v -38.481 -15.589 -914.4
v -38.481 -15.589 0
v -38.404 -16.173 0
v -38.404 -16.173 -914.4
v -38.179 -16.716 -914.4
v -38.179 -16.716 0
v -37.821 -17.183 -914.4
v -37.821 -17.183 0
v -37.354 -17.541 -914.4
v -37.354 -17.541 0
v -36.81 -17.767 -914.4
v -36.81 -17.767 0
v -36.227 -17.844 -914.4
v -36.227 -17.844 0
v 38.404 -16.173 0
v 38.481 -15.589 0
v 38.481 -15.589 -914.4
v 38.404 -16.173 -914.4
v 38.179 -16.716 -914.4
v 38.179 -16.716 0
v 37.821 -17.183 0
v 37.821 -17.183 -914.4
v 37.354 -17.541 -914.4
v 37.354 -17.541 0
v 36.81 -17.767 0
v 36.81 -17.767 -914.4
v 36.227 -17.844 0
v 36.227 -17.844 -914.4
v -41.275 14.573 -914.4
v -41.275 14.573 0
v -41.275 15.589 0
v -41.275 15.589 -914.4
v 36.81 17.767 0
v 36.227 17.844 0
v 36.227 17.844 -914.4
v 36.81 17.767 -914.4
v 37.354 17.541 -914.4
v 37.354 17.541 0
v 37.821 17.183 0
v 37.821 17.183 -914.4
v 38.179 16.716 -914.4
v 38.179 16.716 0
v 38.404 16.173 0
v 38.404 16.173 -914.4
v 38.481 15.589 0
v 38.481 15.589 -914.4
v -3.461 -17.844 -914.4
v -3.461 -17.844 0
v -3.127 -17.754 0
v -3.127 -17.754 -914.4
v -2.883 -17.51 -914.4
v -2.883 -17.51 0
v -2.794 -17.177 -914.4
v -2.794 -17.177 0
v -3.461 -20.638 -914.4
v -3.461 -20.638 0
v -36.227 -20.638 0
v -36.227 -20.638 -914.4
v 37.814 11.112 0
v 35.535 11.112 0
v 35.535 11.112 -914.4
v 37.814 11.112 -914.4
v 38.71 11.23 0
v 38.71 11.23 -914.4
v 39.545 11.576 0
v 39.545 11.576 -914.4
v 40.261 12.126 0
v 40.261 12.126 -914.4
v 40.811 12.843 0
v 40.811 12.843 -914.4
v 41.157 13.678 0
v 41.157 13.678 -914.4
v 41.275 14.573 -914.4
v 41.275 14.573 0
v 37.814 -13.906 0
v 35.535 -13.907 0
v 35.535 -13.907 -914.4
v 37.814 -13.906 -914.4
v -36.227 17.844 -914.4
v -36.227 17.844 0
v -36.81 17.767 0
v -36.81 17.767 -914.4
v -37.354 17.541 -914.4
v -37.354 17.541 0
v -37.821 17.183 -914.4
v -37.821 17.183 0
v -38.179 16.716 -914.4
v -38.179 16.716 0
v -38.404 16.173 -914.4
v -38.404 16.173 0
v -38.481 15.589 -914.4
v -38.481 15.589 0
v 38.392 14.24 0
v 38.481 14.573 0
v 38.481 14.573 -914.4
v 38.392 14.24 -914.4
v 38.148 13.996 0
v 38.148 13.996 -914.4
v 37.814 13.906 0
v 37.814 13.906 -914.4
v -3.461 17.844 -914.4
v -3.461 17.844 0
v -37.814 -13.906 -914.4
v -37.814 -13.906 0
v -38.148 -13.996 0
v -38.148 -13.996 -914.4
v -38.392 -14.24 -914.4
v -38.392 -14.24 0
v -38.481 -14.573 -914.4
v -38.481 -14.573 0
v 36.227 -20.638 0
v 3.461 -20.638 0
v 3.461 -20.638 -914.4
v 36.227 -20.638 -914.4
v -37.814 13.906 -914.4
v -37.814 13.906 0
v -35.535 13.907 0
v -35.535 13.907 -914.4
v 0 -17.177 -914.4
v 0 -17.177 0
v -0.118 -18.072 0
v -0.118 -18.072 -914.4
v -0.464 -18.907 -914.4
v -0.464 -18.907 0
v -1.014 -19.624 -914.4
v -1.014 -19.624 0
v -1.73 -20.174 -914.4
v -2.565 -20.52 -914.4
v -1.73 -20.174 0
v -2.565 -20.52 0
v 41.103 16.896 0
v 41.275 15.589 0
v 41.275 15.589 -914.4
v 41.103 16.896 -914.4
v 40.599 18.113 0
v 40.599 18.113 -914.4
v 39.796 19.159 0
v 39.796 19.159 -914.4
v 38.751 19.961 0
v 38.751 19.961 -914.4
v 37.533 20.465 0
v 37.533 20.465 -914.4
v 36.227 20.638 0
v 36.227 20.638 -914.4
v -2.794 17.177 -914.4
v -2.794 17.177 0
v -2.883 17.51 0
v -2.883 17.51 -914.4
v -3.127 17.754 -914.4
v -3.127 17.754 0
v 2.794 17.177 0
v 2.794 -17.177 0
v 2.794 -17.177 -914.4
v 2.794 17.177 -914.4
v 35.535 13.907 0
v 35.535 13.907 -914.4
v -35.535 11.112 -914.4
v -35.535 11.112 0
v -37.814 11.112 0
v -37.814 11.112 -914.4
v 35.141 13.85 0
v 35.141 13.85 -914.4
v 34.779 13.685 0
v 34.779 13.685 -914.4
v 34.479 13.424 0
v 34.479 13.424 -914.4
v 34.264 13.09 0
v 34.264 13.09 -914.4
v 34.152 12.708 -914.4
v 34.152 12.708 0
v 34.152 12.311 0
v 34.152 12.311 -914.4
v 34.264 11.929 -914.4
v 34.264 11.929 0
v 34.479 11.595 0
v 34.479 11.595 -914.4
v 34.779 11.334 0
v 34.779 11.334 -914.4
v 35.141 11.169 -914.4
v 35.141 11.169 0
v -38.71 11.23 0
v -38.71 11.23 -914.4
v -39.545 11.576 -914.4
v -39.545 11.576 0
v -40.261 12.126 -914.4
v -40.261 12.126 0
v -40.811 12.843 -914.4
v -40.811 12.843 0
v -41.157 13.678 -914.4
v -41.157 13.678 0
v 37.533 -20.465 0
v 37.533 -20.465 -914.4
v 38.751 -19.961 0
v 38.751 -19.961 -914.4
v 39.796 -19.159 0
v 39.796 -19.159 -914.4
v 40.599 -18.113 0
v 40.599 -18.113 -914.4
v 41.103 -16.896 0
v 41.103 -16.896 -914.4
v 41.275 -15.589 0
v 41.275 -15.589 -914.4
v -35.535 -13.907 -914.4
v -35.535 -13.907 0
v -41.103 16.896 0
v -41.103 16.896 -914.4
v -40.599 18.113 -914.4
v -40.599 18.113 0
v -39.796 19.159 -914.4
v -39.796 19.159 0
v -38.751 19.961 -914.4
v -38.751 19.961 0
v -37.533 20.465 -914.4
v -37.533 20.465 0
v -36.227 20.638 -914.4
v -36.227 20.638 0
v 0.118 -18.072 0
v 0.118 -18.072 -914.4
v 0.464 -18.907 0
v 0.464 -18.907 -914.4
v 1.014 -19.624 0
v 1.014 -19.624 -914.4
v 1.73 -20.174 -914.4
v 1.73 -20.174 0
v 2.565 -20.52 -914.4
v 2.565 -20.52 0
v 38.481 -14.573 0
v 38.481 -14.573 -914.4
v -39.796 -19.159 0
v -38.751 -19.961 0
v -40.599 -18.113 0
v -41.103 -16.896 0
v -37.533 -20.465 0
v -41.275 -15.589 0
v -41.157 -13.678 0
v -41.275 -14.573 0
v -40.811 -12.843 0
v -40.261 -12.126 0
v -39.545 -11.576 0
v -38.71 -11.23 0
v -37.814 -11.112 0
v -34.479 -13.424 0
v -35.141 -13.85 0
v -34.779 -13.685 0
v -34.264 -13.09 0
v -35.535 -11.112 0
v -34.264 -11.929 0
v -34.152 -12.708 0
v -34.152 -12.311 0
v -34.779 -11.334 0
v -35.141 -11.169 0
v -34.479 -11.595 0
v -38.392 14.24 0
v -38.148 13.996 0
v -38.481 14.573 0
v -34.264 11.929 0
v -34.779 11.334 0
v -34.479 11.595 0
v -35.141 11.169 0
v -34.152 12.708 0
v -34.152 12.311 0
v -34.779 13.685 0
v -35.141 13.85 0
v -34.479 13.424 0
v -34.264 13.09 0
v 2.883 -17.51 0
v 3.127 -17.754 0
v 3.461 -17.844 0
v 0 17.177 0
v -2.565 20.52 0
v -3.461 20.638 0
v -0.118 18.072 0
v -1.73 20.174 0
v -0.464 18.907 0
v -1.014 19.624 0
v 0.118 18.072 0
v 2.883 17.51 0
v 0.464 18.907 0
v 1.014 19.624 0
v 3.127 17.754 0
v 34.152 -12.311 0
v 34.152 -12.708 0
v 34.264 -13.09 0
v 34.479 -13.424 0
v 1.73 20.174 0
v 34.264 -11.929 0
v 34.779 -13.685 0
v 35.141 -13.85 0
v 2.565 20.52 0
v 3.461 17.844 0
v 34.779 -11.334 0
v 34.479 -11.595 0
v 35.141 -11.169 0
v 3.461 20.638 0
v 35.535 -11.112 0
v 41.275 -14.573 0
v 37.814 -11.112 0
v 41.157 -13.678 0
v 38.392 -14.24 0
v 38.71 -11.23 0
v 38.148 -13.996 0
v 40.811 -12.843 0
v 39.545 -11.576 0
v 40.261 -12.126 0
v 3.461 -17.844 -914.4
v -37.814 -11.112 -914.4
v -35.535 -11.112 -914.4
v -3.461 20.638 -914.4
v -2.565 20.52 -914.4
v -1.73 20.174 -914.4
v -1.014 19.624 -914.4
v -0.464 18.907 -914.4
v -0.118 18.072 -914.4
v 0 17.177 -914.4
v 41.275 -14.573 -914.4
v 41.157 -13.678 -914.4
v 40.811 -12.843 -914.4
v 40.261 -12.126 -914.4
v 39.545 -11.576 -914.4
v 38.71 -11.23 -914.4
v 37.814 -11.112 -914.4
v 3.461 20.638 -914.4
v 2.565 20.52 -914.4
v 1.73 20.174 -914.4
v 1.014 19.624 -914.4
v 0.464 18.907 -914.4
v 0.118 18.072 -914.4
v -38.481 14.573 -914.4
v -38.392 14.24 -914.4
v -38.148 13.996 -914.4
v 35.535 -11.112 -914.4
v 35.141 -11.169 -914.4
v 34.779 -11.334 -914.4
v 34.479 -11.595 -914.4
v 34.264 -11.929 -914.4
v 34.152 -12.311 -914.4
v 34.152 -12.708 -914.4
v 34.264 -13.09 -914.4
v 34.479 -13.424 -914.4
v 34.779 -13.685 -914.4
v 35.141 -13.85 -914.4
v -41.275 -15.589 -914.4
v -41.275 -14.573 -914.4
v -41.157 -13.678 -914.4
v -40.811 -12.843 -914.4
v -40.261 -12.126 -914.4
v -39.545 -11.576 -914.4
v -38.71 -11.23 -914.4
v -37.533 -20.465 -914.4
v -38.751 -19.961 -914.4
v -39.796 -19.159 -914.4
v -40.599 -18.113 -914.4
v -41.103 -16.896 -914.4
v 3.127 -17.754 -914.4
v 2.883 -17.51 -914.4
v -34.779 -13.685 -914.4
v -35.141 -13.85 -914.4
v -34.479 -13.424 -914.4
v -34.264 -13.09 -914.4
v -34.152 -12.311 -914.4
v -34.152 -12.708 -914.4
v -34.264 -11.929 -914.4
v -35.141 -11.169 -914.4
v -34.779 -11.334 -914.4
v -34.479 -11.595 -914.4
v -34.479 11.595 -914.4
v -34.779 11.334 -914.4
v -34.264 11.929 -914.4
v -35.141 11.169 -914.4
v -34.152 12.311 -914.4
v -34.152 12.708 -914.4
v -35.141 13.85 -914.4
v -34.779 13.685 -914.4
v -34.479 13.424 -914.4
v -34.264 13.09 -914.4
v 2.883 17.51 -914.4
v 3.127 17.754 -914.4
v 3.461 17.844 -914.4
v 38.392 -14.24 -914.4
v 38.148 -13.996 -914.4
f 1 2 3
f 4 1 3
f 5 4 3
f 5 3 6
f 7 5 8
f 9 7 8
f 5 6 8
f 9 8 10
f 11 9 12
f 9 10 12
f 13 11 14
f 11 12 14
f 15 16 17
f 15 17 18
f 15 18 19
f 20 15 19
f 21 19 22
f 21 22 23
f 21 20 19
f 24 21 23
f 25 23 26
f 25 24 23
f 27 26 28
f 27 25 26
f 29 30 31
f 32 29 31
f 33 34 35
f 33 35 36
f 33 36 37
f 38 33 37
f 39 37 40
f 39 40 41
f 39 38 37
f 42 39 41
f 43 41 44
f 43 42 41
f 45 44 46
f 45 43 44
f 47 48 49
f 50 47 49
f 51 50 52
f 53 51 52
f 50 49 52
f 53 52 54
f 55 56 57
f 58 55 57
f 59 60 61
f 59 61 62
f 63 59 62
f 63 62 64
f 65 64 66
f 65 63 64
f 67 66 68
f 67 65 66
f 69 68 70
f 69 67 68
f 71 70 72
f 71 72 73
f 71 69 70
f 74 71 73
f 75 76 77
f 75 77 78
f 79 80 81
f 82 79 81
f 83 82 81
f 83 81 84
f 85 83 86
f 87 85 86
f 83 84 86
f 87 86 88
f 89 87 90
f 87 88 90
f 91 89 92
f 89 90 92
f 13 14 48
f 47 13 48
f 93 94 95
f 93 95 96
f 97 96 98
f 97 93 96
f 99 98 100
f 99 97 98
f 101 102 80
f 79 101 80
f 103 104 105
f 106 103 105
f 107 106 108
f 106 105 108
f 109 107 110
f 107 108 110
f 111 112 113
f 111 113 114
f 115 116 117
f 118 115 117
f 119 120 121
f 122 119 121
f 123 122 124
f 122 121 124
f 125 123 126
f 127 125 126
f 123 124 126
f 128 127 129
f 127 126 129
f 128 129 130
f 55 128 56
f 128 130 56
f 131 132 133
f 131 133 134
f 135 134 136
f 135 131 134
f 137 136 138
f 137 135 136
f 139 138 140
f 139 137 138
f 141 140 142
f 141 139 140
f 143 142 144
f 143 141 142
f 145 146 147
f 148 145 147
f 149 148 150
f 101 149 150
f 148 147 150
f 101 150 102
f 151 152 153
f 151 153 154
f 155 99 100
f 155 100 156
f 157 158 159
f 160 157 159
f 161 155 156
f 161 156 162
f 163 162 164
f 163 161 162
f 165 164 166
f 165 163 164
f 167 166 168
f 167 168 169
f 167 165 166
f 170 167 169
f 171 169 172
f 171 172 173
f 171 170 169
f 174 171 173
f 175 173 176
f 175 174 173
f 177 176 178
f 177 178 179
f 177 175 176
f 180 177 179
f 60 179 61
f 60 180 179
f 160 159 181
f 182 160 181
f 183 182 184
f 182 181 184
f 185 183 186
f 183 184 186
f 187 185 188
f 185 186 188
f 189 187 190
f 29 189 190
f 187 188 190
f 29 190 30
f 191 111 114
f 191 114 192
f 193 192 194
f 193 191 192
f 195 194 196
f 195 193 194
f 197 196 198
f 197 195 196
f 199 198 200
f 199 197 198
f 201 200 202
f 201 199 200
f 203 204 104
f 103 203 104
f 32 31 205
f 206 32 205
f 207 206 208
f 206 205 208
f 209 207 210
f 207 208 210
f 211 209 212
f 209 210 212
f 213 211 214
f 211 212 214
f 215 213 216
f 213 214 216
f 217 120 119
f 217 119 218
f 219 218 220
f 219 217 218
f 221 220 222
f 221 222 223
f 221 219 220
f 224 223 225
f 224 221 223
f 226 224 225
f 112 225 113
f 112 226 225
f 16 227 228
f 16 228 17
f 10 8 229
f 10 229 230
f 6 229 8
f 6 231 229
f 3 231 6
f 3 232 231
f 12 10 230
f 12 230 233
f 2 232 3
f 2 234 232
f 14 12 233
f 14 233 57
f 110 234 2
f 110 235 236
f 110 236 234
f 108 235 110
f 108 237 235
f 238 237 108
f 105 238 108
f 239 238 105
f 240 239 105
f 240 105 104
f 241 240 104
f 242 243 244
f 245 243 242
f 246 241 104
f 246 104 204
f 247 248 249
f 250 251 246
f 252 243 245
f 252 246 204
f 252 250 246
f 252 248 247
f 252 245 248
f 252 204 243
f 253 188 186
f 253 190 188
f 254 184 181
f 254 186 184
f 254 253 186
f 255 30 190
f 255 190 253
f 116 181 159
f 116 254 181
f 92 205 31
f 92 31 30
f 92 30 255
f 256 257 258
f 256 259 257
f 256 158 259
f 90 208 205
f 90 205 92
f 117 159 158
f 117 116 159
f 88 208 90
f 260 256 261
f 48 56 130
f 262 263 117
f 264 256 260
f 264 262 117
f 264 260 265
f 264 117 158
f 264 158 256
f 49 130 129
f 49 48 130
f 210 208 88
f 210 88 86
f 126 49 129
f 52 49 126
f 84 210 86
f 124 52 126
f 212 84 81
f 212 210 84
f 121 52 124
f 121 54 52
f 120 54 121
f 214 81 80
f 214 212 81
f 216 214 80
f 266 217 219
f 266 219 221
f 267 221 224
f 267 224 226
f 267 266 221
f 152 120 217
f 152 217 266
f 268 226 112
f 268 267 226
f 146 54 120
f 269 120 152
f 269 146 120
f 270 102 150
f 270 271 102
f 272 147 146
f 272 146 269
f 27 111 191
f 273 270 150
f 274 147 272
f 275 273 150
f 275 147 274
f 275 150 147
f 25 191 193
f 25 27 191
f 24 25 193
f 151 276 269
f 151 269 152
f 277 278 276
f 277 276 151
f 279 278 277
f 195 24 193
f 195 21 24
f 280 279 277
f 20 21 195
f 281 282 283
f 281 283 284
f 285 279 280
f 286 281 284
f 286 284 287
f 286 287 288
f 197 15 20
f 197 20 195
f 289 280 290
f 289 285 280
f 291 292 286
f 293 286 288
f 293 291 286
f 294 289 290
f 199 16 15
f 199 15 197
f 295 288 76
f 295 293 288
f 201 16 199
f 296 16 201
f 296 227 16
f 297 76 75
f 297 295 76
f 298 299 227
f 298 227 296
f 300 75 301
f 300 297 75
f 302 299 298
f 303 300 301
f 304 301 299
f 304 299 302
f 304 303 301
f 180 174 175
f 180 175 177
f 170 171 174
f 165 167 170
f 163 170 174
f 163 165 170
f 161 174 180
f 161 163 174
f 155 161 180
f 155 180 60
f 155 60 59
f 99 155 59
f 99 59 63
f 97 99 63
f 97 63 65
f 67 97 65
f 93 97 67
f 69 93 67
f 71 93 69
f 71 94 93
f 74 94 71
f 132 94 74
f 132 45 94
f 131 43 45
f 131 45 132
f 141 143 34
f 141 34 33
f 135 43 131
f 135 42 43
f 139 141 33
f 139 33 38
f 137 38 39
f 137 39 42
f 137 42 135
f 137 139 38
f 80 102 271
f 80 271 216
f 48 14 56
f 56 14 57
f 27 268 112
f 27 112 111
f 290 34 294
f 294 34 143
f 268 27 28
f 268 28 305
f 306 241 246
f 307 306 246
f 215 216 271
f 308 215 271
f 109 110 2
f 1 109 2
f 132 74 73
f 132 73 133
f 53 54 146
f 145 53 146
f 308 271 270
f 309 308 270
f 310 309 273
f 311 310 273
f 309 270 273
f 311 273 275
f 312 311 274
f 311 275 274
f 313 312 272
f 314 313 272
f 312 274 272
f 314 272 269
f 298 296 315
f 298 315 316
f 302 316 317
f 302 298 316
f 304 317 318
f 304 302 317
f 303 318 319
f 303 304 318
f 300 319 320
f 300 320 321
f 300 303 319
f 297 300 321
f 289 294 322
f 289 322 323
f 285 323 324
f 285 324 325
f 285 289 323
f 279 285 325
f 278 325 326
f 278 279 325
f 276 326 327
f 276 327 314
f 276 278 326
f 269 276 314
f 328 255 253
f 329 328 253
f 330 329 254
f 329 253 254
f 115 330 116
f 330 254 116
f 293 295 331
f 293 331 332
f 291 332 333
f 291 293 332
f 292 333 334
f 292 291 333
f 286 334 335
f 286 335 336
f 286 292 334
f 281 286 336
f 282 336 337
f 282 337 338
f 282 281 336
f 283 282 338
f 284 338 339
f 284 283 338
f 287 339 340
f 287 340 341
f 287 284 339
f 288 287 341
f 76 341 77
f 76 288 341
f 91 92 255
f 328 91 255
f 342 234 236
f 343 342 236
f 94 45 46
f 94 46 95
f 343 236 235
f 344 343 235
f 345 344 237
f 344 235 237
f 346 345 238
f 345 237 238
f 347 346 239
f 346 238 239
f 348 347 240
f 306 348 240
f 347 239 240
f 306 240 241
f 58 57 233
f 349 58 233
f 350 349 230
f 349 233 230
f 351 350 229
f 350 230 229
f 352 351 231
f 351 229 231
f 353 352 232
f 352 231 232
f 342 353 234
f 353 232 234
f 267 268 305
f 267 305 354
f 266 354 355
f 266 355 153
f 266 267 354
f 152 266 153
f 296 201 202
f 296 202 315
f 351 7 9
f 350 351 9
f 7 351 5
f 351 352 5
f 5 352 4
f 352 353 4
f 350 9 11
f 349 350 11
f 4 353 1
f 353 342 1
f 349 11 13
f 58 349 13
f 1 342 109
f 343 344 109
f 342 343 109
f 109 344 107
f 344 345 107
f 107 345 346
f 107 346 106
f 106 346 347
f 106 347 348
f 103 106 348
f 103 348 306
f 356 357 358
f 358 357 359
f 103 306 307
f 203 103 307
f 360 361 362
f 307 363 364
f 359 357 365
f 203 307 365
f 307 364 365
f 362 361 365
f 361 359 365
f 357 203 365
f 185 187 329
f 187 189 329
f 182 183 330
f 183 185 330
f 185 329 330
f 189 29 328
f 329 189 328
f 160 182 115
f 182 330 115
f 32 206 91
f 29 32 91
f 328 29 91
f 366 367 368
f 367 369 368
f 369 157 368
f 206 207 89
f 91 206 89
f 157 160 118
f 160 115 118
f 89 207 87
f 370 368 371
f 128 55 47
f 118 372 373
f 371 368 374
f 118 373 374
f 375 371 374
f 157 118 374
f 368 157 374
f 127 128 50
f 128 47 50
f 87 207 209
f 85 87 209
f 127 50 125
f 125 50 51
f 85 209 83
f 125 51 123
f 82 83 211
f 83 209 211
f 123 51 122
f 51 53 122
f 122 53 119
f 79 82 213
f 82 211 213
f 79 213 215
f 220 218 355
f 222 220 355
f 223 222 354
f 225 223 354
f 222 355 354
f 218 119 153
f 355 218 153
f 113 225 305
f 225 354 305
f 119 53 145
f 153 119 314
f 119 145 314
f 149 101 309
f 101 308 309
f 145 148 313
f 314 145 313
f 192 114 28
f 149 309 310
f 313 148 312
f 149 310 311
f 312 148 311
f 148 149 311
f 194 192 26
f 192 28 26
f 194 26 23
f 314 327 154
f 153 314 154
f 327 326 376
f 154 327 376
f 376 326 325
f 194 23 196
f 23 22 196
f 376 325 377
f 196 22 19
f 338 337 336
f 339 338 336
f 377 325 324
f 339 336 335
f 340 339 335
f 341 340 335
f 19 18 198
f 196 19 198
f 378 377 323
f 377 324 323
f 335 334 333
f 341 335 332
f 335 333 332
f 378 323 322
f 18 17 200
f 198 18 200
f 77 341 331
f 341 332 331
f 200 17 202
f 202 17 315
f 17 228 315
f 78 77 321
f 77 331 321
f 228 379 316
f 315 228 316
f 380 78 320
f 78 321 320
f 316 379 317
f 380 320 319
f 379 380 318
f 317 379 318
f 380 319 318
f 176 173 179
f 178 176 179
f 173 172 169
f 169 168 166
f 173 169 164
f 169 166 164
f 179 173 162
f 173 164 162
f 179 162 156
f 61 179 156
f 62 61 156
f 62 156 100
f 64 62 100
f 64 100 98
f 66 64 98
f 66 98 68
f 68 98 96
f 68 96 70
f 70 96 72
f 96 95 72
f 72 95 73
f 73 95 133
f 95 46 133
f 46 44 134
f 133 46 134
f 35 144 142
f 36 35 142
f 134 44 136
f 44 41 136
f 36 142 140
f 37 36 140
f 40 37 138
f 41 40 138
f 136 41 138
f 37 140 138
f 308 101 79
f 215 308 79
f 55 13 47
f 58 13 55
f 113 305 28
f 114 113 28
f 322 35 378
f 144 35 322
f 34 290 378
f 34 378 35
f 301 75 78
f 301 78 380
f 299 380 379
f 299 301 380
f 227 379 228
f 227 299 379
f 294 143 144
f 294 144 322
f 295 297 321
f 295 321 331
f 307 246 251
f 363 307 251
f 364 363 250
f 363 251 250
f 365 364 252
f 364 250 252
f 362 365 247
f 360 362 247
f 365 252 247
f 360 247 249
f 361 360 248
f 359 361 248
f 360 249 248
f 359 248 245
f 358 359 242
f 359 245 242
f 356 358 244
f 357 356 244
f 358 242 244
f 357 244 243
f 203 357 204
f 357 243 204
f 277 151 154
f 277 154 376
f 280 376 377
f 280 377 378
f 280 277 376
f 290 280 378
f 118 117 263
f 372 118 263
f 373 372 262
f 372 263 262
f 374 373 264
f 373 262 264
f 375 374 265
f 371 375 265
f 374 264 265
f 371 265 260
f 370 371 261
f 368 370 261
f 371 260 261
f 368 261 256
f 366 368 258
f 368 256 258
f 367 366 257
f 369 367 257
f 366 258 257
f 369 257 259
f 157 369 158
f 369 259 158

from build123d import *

# Parameters (mm, degrees)
BOSS_EXTRUDE1_DEPTH = 914.4


with BuildPart() as part:
    # Sketch1 → Boss-Extrude1 (new body)
    with BuildSketch(Plane.XY):
        with BuildLine():
            Line((-36.22675, 20.6375), (-3.46075, 20.6375))
            ThreePointArc((-3.46075, 20.6375), (-1.013630207, 19.623869793), (0, 17.17675))
            Line((0, 17.17675), (0, -17.17675))
            ThreePointArc((0, -17.17675), (-1.013630207, -19.623869793), (-3.46075, -20.6375))
            Line((-3.46075, -20.6375), (-36.22675, -20.6375))
            ThreePointArc((-36.22675, -20.6375), (-39.796401808, -19.158901808), (-41.275, -15.58925))
            Line((-41.275, -15.58925), (-41.275, -14.57325))
            ThreePointArc((-41.275, -14.57325), (-40.261369793, -12.126130207), (-37.81425, -11.1125))
            Line((-37.81425, -11.1125), (-35.5346, -11.1125))
            ThreePointArc((-35.5346, -11.1125), (-34.1376, -12.5095), (-35.5346, -13.9065))
            Line((-35.5346, -13.9065), (-37.81425, -13.9065))
            ThreePointArc((-37.81425, -13.9065), (-38.285713446, -14.101786554), (-38.481, -14.57325))
            Line((-38.481, -14.57325), (-38.481, -15.58925))
            ThreePointArc((-38.481, -15.58925), (-37.820745461, -17.183245461), (-36.22675, -17.8435))
            Line((-36.22675, -17.8435), (-3.46075, -17.8435))
            ThreePointArc((-3.46075, -17.8435), (-2.989286554, -17.648213446), (-2.794, -17.17675))
            Line((-2.794, -17.17675), (-2.794, 17.17675))
            ThreePointArc((-2.794, 17.17675), (-2.989286554, 17.648213446), (-3.46075, 17.8435))
            Line((-3.46075, 17.8435), (-36.22675, 17.8435))
            ThreePointArc((-36.22675, 17.8435), (-37.820745461, 17.183245461), (-38.481, 15.58925))
            Line((-38.481, 15.58925), (-38.481, 14.57325))
            ThreePointArc((-38.481, 14.57325), (-38.285713446, 14.101786554), (-37.81425, 13.9065))
            Line((-37.81425, 13.9065), (-35.5346, 13.9065))
            ThreePointArc((-35.5346, 13.9065), (-34.1376, 12.5095), (-35.5346, 11.1125))
            Line((-35.5346, 11.1125), (-37.81425, 11.1125))
            ThreePointArc((-37.81425, 11.1125), (-40.261369793, 12.126130207), (-41.275, 14.57325))
            Line((-41.275, 14.57325), (-41.275, 15.58925))
            ThreePointArc((-41.275, 15.58925), (-39.796401808, 19.158901808), (-36.22675, 20.6375))
        make_face()
    extrude(amount=-BOSS_EXTRUDE1_DEPTH)


with BuildPart() as body_2:
    # Mirror1: mirrored copy
    add(part.part.mirror(Plane(origin=(0, 17.17675, -914.4), x_dir=(0, 0, 1), z_dir=(1, 0, 0))))


with BuildPart() as part_1:
    add(part.part)

    # Combine1: union body 2
    add(body_2.part)


solid = part_1.part
